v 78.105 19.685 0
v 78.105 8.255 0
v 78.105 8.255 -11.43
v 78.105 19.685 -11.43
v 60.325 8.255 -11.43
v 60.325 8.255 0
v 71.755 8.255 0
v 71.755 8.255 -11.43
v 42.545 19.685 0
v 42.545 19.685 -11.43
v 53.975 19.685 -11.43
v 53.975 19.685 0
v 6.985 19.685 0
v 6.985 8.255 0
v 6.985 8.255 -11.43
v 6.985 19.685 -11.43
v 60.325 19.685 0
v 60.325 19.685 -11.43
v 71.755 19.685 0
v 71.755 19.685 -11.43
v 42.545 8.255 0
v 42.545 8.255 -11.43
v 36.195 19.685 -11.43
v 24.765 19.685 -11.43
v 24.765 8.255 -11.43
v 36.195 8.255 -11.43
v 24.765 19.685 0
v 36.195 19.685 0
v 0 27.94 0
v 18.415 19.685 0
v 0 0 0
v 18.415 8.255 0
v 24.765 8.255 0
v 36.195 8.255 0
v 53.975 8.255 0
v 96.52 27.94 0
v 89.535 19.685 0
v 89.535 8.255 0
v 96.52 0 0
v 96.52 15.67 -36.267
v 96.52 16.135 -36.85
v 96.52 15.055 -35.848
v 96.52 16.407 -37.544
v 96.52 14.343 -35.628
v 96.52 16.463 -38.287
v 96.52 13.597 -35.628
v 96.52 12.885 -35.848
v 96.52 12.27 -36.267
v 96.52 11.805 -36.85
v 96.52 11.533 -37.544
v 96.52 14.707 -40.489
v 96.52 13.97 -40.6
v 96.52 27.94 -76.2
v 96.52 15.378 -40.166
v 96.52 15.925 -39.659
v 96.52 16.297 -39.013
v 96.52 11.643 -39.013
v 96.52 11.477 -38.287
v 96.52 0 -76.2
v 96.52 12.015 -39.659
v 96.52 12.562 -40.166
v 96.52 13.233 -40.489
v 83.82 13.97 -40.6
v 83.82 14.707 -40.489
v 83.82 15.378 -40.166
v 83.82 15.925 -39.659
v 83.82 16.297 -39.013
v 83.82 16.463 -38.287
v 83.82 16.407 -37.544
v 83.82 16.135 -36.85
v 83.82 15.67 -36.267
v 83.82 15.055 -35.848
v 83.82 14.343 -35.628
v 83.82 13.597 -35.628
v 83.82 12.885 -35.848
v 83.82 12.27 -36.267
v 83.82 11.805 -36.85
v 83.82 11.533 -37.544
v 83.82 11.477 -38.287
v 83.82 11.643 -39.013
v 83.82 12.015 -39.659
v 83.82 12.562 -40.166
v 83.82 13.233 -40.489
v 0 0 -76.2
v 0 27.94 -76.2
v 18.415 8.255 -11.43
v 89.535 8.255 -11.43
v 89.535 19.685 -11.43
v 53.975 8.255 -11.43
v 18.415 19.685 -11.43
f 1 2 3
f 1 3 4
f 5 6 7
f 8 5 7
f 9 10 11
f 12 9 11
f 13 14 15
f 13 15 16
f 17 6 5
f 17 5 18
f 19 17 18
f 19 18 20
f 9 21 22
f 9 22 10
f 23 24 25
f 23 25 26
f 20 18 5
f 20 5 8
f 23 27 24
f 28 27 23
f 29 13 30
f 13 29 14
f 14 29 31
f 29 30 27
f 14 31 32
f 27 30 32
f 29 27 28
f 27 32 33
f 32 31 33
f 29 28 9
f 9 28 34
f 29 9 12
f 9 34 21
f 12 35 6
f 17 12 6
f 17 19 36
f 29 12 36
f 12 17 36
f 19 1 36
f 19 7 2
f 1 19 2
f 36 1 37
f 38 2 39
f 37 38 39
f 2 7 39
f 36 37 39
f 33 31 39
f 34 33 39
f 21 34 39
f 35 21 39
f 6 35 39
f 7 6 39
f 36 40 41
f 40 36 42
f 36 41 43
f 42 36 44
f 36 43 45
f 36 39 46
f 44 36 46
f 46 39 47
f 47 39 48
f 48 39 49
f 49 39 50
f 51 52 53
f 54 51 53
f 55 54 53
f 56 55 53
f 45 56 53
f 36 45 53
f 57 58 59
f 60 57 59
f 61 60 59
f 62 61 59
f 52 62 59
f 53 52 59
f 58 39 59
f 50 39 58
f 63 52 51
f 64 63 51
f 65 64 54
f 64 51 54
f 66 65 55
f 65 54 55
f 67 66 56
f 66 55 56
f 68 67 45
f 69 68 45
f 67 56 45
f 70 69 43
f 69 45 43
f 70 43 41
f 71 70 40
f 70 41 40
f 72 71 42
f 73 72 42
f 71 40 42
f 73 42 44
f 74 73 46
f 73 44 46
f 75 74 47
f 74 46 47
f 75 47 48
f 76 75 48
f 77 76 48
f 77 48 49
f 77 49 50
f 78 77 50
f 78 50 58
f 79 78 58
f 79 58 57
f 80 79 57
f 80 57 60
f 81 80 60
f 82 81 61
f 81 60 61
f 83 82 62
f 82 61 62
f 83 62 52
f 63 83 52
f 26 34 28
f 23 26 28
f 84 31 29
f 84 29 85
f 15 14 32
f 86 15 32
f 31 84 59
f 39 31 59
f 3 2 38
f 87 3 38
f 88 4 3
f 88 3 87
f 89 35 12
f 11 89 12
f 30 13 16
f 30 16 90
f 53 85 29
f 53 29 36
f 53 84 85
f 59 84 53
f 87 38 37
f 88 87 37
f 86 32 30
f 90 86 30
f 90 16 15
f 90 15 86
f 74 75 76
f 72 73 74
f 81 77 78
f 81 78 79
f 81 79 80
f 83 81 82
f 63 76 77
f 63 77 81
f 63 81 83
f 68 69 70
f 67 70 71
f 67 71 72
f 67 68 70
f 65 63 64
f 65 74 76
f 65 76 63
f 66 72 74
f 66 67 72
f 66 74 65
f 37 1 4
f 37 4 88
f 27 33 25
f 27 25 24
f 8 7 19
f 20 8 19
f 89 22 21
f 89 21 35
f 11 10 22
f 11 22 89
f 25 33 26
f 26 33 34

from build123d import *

# Parameters (mm, degrees)
SKETCH1_W           = 96.52
SKETCH1_H           = 76.2
BOSS_EXTRUDE1_DEPTH = 27.94
SKETCH2_W           = 11.43
SKETCH2_H           = 11.43
CUT_EXTRUDE1_DEPTH  = 11.43
SKETCH3_R           = 2.5
CUT_EXTRUDE2_DEPTH  = 12.7


with BuildPart() as part:
    # Sketch1 → Boss-Extrude1 (new body)
    with BuildSketch(Plane(origin=(0, 0, 0), x_dir=(1, 0, 0), z_dir=(0, 1, 0))):
        with Locations((48.26, 38.1)):
            Rectangle(SKETCH1_W, SKETCH1_H)
    extrude(amount=BOSS_EXTRUDE1_DEPTH)

    # Sketch2 → Cut-Extrude1 (cut)
    with BuildSketch(Plane.XY):
        with Locations((12.7, 13.97)):
            Rectangle(SKETCH2_W, SKETCH2_H)
        with Locations((30.48, 13.97)):
            Rectangle(SKETCH2_W, SKETCH2_H)
        with Locations((48.26, 13.97)):
            Rectangle(SKETCH2_W, SKETCH2_H)
        with Locations((66.04, 13.97)):
            Rectangle(SKETCH2_W, SKETCH2_H)
        with Locations((83.82, 13.97)):
            Rectangle(SKETCH2_W, SKETCH2_H)
    extrude(amount=-CUT_EXTRUDE1_DEPTH, mode=Mode.SUBTRACT)

    # Sketch3 → Cut-Extrude2 (cut)
    with BuildSketch(Plane(origin=(96.52, 0, 0), x_dir=(0, 0, -1), z_dir=(1, 0, 0))):
        with Locations((38.1, 13.97)):
            Circle(SKETCH3_R)
    extrude(amount=-CUT_EXTRUDE2_DEPTH, mode=Mode.SUBTRACT)


solid = part.part
